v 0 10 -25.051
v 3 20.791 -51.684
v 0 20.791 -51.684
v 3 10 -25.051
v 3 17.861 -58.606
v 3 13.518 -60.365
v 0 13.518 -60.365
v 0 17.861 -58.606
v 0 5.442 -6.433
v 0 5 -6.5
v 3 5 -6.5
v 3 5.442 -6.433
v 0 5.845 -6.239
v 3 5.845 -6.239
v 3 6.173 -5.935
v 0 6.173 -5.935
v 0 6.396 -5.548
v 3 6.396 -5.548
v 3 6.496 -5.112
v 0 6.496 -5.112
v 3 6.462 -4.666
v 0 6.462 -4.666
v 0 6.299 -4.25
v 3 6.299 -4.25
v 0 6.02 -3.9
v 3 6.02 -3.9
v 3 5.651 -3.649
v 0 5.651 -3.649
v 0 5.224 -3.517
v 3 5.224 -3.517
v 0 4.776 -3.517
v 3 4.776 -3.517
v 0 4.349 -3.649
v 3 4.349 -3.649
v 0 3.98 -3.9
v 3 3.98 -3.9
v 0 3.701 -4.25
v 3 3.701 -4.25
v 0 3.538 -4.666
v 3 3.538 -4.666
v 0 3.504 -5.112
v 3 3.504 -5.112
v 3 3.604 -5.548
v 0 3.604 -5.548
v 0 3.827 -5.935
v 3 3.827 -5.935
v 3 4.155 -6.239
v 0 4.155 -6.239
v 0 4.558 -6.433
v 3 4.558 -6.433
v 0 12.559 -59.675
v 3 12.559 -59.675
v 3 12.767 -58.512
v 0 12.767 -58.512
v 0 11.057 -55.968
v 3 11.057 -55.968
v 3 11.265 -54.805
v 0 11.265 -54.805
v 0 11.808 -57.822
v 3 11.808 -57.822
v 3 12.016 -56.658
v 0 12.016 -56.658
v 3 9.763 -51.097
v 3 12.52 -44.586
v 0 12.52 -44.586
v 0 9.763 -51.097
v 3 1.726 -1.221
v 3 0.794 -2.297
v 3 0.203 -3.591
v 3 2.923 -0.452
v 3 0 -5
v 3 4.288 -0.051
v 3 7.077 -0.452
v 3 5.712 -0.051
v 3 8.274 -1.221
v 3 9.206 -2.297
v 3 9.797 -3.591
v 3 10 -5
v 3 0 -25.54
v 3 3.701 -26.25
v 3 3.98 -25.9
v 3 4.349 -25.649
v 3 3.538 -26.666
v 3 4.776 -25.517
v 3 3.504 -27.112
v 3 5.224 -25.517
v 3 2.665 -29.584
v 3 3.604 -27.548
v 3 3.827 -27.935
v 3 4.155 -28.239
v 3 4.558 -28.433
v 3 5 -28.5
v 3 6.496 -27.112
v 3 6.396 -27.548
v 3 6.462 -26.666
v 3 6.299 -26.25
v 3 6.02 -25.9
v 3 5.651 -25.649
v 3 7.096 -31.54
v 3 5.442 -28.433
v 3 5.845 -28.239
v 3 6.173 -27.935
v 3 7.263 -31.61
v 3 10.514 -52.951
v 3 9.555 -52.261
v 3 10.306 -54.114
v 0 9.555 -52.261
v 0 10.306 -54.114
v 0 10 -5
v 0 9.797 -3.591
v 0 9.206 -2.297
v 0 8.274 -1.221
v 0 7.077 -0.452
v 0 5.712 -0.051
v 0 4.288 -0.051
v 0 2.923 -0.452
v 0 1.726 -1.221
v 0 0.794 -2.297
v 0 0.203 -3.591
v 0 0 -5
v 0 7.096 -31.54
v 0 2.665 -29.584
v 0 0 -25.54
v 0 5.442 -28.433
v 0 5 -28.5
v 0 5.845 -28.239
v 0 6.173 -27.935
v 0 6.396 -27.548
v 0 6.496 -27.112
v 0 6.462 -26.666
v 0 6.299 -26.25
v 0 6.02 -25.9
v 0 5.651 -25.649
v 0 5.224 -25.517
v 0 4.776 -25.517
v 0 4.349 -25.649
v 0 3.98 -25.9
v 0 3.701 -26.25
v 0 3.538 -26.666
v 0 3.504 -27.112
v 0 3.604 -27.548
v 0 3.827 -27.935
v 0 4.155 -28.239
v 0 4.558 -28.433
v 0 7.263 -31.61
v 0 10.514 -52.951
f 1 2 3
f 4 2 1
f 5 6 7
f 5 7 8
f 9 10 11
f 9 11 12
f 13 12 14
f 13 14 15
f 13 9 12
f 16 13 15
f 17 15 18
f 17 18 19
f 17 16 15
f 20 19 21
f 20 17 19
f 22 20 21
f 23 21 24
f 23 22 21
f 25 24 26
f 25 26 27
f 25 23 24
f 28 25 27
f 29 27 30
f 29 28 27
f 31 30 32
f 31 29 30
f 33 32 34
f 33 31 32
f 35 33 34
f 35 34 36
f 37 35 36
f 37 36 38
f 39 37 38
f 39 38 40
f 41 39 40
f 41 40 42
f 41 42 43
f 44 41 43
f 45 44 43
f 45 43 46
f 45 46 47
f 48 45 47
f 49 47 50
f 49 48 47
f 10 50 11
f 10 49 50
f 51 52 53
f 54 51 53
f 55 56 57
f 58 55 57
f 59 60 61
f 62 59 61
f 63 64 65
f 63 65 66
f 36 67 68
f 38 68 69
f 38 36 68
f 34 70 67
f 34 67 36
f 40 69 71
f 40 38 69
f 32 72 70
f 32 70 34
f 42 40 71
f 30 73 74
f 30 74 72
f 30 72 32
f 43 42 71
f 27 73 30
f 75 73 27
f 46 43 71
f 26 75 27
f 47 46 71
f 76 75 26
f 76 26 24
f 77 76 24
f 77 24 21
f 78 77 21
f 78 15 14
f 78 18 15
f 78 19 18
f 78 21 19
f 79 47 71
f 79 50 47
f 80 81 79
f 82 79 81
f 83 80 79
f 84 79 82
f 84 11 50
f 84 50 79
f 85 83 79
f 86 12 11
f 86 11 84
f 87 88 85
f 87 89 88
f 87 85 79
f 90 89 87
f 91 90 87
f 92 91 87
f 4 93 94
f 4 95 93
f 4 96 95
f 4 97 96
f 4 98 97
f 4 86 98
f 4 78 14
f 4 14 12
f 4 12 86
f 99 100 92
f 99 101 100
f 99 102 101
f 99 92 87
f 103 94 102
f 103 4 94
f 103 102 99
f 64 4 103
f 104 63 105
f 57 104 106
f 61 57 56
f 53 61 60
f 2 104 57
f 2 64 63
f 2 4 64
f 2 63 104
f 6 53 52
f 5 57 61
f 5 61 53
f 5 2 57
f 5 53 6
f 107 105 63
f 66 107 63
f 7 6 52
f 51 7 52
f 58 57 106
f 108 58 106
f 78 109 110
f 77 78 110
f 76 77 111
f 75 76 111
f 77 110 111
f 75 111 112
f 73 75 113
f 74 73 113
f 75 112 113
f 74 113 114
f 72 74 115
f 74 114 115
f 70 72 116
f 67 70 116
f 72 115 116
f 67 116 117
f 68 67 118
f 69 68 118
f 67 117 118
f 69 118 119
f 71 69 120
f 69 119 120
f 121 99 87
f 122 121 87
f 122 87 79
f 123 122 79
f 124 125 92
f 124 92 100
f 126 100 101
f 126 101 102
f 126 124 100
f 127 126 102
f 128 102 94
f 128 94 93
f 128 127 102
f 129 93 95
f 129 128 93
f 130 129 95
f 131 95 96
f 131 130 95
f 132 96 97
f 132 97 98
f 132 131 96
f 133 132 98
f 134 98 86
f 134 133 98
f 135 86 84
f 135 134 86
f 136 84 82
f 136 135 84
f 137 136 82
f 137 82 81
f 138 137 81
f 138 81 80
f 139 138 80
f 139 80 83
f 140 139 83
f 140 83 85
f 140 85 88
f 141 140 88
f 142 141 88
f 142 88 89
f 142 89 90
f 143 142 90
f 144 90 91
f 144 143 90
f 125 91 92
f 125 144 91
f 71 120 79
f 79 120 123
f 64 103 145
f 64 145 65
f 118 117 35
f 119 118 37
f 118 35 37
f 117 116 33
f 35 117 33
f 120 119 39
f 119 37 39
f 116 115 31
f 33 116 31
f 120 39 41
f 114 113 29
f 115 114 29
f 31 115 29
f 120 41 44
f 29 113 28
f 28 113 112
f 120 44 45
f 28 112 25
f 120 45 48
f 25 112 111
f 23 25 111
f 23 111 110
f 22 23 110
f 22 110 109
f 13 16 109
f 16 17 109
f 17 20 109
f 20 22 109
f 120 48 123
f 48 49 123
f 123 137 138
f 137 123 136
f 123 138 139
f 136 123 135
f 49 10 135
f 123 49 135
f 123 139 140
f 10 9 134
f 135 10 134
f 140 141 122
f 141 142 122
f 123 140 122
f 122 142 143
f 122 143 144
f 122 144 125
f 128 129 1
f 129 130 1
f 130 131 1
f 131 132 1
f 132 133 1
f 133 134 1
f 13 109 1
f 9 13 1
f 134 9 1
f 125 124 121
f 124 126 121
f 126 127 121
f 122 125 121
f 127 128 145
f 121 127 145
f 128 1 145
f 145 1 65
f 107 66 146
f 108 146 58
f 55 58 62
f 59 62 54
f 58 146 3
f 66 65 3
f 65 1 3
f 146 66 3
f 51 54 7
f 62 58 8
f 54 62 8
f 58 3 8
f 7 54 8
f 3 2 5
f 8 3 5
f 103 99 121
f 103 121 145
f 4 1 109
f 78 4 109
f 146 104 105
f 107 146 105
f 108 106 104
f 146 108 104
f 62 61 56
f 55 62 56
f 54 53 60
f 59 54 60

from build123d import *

# Parameters (mm, degrees)
SKETCH1_R           = 5
SKETCH1_R_2         = 1.5
BOSS_EXTRUDE1_DEPTH = 3
BOSS_EXTRUDE2_DEPTH = 3
CUT_EXTRUDE2_DEPTH  = 4
CUT_EXTRUDE3_DEPTH  = 10


with BuildPart() as part:
    # Sketch1 → Boss-Extrude1 (new body)
    with BuildSketch(Plane(origin=(0, 0, 0), x_dir=(0, 0, -1), z_dir=(1, 0, 0))):
        with Locations((5, 5)):
            Circle(SKETCH1_R)
        with Locations((5, 5)):
            Circle(SKETCH1_R_2, mode=Mode.SUBTRACT)
        with BuildLine():
            ThreePointArc((10, 5), (8.535533906, 1.464466094), (5, 0))
            Line((5, 0), (27, 0))
            ThreePointArc((27, 0), (22, 5), (27, 10))
            Line((27, 10), (5, 10))
            ThreePointArc((5, 10), (8.535533906, 8.535533906), (10, 5))
        make_face()
        with Locations((27, 5)):
            Circle(SKETCH1_R)
        with Locations((27, 5)):
            Circle(SKETCH1_R_2, mode=Mode.SUBTRACT)
    extrude(amount=BOSS_EXTRUDE1_DEPTH)

    # Sketch2 → Boss-Extrude2 (add)
    with BuildSketch(Plane(origin=(3, 0, 0), x_dir=(0, 0, -1), z_dir=(1, 0, 0))):
        with BuildLine():
            ThreePointArc((27, 10), (29.694507461, 9.21184396), (31.53953799, 7.095851816))
            Line((31.53953799, 7.095851816), (31.610157793, 7.262674791))
            Line((31.610157793, 7.262674791), (44.585599673, 12.519851602))
            Line((44.585599673, 12.519851602), (51.097249205, 9.763328363))
            Line((51.097249205, 9.763328363), (60.365421977, 13.518454657))
            Line((60.365421977, 13.518454657), (56.610295683, 22.786627428))
            Line((56.610295683, 22.786627428), (25.051124858, 10))
            Line((25.051124858, 10), (27, 10))
        make_face()
        Polygon((60.365421977, 13.518454657), (51.097249205, 9.763328363), (51.333822162, 9.179433479), (60.601994933, 12.934559772), align=None)
    extrude(amount=-BOSS_EXTRUDE2_DEPTH)

    # Sketch4 → Cut-Extrude2 (cut, through all)
    with BuildSketch(Plane(origin=(3, 0, 0), x_dir=(0, 0, -1), z_dir=(1, 0, 0))):
        Polygon((56.610295683, 22.786627428), (51.684261855, 20.790777803), (58.606145308, 17.8605936), align=None)
    extrude(amount=-CUT_EXTRUDE2_DEPTH, mode=Mode.SUBTRACT)

    # Sketch5 → Cut-Extrude3 (cut)
    with BuildSketch(Plane(origin=(3, 0, 0), x_dir=(0, 0, -1), z_dir=(1, 0, 0))):
        with BuildLine():
            ThreePointArc((27, 0), (31.21184396, 2.305492539), (31.53953799, 7.095851816))
            Line((31.53953799, 7.095851816), (29.583779735, 2.664986829))
            Line((29.583779735, 2.664986829), (25.539598719, 0))
            Line((25.539598719, 0), (27, 0))
        make_face()
        Polygon((52.260639439, 9.554946108), (51.097249205, 9.763328363), (51.333822162, 9.179433479), align=None)
        Polygon((52.95088376, 10.514353622), (52.260639439, 9.554946108), (54.114273993, 10.305971367), align=None)
        Polygon((54.804518314, 11.265378881), (54.114273993, 10.305971367), (55.967908548, 11.056996626), align=None)
        Polygon((56.658152868, 12.01640414), (55.967908548, 11.056996626), (57.821543102, 11.808021884), align=None)
        Polygon((58.511787422, 12.767429398), (57.821543102, 11.808021884), (59.675177656, 12.559047143), align=None)
        Polygon((60.365421977, 13.518454657), (59.675177656, 12.559047143), (60.601994933, 12.934559772), align=None)
    extrude(amount=-CUT_EXTRUDE3_DEPTH, mode=Mode.SUBTRACT)


solid = part.part
